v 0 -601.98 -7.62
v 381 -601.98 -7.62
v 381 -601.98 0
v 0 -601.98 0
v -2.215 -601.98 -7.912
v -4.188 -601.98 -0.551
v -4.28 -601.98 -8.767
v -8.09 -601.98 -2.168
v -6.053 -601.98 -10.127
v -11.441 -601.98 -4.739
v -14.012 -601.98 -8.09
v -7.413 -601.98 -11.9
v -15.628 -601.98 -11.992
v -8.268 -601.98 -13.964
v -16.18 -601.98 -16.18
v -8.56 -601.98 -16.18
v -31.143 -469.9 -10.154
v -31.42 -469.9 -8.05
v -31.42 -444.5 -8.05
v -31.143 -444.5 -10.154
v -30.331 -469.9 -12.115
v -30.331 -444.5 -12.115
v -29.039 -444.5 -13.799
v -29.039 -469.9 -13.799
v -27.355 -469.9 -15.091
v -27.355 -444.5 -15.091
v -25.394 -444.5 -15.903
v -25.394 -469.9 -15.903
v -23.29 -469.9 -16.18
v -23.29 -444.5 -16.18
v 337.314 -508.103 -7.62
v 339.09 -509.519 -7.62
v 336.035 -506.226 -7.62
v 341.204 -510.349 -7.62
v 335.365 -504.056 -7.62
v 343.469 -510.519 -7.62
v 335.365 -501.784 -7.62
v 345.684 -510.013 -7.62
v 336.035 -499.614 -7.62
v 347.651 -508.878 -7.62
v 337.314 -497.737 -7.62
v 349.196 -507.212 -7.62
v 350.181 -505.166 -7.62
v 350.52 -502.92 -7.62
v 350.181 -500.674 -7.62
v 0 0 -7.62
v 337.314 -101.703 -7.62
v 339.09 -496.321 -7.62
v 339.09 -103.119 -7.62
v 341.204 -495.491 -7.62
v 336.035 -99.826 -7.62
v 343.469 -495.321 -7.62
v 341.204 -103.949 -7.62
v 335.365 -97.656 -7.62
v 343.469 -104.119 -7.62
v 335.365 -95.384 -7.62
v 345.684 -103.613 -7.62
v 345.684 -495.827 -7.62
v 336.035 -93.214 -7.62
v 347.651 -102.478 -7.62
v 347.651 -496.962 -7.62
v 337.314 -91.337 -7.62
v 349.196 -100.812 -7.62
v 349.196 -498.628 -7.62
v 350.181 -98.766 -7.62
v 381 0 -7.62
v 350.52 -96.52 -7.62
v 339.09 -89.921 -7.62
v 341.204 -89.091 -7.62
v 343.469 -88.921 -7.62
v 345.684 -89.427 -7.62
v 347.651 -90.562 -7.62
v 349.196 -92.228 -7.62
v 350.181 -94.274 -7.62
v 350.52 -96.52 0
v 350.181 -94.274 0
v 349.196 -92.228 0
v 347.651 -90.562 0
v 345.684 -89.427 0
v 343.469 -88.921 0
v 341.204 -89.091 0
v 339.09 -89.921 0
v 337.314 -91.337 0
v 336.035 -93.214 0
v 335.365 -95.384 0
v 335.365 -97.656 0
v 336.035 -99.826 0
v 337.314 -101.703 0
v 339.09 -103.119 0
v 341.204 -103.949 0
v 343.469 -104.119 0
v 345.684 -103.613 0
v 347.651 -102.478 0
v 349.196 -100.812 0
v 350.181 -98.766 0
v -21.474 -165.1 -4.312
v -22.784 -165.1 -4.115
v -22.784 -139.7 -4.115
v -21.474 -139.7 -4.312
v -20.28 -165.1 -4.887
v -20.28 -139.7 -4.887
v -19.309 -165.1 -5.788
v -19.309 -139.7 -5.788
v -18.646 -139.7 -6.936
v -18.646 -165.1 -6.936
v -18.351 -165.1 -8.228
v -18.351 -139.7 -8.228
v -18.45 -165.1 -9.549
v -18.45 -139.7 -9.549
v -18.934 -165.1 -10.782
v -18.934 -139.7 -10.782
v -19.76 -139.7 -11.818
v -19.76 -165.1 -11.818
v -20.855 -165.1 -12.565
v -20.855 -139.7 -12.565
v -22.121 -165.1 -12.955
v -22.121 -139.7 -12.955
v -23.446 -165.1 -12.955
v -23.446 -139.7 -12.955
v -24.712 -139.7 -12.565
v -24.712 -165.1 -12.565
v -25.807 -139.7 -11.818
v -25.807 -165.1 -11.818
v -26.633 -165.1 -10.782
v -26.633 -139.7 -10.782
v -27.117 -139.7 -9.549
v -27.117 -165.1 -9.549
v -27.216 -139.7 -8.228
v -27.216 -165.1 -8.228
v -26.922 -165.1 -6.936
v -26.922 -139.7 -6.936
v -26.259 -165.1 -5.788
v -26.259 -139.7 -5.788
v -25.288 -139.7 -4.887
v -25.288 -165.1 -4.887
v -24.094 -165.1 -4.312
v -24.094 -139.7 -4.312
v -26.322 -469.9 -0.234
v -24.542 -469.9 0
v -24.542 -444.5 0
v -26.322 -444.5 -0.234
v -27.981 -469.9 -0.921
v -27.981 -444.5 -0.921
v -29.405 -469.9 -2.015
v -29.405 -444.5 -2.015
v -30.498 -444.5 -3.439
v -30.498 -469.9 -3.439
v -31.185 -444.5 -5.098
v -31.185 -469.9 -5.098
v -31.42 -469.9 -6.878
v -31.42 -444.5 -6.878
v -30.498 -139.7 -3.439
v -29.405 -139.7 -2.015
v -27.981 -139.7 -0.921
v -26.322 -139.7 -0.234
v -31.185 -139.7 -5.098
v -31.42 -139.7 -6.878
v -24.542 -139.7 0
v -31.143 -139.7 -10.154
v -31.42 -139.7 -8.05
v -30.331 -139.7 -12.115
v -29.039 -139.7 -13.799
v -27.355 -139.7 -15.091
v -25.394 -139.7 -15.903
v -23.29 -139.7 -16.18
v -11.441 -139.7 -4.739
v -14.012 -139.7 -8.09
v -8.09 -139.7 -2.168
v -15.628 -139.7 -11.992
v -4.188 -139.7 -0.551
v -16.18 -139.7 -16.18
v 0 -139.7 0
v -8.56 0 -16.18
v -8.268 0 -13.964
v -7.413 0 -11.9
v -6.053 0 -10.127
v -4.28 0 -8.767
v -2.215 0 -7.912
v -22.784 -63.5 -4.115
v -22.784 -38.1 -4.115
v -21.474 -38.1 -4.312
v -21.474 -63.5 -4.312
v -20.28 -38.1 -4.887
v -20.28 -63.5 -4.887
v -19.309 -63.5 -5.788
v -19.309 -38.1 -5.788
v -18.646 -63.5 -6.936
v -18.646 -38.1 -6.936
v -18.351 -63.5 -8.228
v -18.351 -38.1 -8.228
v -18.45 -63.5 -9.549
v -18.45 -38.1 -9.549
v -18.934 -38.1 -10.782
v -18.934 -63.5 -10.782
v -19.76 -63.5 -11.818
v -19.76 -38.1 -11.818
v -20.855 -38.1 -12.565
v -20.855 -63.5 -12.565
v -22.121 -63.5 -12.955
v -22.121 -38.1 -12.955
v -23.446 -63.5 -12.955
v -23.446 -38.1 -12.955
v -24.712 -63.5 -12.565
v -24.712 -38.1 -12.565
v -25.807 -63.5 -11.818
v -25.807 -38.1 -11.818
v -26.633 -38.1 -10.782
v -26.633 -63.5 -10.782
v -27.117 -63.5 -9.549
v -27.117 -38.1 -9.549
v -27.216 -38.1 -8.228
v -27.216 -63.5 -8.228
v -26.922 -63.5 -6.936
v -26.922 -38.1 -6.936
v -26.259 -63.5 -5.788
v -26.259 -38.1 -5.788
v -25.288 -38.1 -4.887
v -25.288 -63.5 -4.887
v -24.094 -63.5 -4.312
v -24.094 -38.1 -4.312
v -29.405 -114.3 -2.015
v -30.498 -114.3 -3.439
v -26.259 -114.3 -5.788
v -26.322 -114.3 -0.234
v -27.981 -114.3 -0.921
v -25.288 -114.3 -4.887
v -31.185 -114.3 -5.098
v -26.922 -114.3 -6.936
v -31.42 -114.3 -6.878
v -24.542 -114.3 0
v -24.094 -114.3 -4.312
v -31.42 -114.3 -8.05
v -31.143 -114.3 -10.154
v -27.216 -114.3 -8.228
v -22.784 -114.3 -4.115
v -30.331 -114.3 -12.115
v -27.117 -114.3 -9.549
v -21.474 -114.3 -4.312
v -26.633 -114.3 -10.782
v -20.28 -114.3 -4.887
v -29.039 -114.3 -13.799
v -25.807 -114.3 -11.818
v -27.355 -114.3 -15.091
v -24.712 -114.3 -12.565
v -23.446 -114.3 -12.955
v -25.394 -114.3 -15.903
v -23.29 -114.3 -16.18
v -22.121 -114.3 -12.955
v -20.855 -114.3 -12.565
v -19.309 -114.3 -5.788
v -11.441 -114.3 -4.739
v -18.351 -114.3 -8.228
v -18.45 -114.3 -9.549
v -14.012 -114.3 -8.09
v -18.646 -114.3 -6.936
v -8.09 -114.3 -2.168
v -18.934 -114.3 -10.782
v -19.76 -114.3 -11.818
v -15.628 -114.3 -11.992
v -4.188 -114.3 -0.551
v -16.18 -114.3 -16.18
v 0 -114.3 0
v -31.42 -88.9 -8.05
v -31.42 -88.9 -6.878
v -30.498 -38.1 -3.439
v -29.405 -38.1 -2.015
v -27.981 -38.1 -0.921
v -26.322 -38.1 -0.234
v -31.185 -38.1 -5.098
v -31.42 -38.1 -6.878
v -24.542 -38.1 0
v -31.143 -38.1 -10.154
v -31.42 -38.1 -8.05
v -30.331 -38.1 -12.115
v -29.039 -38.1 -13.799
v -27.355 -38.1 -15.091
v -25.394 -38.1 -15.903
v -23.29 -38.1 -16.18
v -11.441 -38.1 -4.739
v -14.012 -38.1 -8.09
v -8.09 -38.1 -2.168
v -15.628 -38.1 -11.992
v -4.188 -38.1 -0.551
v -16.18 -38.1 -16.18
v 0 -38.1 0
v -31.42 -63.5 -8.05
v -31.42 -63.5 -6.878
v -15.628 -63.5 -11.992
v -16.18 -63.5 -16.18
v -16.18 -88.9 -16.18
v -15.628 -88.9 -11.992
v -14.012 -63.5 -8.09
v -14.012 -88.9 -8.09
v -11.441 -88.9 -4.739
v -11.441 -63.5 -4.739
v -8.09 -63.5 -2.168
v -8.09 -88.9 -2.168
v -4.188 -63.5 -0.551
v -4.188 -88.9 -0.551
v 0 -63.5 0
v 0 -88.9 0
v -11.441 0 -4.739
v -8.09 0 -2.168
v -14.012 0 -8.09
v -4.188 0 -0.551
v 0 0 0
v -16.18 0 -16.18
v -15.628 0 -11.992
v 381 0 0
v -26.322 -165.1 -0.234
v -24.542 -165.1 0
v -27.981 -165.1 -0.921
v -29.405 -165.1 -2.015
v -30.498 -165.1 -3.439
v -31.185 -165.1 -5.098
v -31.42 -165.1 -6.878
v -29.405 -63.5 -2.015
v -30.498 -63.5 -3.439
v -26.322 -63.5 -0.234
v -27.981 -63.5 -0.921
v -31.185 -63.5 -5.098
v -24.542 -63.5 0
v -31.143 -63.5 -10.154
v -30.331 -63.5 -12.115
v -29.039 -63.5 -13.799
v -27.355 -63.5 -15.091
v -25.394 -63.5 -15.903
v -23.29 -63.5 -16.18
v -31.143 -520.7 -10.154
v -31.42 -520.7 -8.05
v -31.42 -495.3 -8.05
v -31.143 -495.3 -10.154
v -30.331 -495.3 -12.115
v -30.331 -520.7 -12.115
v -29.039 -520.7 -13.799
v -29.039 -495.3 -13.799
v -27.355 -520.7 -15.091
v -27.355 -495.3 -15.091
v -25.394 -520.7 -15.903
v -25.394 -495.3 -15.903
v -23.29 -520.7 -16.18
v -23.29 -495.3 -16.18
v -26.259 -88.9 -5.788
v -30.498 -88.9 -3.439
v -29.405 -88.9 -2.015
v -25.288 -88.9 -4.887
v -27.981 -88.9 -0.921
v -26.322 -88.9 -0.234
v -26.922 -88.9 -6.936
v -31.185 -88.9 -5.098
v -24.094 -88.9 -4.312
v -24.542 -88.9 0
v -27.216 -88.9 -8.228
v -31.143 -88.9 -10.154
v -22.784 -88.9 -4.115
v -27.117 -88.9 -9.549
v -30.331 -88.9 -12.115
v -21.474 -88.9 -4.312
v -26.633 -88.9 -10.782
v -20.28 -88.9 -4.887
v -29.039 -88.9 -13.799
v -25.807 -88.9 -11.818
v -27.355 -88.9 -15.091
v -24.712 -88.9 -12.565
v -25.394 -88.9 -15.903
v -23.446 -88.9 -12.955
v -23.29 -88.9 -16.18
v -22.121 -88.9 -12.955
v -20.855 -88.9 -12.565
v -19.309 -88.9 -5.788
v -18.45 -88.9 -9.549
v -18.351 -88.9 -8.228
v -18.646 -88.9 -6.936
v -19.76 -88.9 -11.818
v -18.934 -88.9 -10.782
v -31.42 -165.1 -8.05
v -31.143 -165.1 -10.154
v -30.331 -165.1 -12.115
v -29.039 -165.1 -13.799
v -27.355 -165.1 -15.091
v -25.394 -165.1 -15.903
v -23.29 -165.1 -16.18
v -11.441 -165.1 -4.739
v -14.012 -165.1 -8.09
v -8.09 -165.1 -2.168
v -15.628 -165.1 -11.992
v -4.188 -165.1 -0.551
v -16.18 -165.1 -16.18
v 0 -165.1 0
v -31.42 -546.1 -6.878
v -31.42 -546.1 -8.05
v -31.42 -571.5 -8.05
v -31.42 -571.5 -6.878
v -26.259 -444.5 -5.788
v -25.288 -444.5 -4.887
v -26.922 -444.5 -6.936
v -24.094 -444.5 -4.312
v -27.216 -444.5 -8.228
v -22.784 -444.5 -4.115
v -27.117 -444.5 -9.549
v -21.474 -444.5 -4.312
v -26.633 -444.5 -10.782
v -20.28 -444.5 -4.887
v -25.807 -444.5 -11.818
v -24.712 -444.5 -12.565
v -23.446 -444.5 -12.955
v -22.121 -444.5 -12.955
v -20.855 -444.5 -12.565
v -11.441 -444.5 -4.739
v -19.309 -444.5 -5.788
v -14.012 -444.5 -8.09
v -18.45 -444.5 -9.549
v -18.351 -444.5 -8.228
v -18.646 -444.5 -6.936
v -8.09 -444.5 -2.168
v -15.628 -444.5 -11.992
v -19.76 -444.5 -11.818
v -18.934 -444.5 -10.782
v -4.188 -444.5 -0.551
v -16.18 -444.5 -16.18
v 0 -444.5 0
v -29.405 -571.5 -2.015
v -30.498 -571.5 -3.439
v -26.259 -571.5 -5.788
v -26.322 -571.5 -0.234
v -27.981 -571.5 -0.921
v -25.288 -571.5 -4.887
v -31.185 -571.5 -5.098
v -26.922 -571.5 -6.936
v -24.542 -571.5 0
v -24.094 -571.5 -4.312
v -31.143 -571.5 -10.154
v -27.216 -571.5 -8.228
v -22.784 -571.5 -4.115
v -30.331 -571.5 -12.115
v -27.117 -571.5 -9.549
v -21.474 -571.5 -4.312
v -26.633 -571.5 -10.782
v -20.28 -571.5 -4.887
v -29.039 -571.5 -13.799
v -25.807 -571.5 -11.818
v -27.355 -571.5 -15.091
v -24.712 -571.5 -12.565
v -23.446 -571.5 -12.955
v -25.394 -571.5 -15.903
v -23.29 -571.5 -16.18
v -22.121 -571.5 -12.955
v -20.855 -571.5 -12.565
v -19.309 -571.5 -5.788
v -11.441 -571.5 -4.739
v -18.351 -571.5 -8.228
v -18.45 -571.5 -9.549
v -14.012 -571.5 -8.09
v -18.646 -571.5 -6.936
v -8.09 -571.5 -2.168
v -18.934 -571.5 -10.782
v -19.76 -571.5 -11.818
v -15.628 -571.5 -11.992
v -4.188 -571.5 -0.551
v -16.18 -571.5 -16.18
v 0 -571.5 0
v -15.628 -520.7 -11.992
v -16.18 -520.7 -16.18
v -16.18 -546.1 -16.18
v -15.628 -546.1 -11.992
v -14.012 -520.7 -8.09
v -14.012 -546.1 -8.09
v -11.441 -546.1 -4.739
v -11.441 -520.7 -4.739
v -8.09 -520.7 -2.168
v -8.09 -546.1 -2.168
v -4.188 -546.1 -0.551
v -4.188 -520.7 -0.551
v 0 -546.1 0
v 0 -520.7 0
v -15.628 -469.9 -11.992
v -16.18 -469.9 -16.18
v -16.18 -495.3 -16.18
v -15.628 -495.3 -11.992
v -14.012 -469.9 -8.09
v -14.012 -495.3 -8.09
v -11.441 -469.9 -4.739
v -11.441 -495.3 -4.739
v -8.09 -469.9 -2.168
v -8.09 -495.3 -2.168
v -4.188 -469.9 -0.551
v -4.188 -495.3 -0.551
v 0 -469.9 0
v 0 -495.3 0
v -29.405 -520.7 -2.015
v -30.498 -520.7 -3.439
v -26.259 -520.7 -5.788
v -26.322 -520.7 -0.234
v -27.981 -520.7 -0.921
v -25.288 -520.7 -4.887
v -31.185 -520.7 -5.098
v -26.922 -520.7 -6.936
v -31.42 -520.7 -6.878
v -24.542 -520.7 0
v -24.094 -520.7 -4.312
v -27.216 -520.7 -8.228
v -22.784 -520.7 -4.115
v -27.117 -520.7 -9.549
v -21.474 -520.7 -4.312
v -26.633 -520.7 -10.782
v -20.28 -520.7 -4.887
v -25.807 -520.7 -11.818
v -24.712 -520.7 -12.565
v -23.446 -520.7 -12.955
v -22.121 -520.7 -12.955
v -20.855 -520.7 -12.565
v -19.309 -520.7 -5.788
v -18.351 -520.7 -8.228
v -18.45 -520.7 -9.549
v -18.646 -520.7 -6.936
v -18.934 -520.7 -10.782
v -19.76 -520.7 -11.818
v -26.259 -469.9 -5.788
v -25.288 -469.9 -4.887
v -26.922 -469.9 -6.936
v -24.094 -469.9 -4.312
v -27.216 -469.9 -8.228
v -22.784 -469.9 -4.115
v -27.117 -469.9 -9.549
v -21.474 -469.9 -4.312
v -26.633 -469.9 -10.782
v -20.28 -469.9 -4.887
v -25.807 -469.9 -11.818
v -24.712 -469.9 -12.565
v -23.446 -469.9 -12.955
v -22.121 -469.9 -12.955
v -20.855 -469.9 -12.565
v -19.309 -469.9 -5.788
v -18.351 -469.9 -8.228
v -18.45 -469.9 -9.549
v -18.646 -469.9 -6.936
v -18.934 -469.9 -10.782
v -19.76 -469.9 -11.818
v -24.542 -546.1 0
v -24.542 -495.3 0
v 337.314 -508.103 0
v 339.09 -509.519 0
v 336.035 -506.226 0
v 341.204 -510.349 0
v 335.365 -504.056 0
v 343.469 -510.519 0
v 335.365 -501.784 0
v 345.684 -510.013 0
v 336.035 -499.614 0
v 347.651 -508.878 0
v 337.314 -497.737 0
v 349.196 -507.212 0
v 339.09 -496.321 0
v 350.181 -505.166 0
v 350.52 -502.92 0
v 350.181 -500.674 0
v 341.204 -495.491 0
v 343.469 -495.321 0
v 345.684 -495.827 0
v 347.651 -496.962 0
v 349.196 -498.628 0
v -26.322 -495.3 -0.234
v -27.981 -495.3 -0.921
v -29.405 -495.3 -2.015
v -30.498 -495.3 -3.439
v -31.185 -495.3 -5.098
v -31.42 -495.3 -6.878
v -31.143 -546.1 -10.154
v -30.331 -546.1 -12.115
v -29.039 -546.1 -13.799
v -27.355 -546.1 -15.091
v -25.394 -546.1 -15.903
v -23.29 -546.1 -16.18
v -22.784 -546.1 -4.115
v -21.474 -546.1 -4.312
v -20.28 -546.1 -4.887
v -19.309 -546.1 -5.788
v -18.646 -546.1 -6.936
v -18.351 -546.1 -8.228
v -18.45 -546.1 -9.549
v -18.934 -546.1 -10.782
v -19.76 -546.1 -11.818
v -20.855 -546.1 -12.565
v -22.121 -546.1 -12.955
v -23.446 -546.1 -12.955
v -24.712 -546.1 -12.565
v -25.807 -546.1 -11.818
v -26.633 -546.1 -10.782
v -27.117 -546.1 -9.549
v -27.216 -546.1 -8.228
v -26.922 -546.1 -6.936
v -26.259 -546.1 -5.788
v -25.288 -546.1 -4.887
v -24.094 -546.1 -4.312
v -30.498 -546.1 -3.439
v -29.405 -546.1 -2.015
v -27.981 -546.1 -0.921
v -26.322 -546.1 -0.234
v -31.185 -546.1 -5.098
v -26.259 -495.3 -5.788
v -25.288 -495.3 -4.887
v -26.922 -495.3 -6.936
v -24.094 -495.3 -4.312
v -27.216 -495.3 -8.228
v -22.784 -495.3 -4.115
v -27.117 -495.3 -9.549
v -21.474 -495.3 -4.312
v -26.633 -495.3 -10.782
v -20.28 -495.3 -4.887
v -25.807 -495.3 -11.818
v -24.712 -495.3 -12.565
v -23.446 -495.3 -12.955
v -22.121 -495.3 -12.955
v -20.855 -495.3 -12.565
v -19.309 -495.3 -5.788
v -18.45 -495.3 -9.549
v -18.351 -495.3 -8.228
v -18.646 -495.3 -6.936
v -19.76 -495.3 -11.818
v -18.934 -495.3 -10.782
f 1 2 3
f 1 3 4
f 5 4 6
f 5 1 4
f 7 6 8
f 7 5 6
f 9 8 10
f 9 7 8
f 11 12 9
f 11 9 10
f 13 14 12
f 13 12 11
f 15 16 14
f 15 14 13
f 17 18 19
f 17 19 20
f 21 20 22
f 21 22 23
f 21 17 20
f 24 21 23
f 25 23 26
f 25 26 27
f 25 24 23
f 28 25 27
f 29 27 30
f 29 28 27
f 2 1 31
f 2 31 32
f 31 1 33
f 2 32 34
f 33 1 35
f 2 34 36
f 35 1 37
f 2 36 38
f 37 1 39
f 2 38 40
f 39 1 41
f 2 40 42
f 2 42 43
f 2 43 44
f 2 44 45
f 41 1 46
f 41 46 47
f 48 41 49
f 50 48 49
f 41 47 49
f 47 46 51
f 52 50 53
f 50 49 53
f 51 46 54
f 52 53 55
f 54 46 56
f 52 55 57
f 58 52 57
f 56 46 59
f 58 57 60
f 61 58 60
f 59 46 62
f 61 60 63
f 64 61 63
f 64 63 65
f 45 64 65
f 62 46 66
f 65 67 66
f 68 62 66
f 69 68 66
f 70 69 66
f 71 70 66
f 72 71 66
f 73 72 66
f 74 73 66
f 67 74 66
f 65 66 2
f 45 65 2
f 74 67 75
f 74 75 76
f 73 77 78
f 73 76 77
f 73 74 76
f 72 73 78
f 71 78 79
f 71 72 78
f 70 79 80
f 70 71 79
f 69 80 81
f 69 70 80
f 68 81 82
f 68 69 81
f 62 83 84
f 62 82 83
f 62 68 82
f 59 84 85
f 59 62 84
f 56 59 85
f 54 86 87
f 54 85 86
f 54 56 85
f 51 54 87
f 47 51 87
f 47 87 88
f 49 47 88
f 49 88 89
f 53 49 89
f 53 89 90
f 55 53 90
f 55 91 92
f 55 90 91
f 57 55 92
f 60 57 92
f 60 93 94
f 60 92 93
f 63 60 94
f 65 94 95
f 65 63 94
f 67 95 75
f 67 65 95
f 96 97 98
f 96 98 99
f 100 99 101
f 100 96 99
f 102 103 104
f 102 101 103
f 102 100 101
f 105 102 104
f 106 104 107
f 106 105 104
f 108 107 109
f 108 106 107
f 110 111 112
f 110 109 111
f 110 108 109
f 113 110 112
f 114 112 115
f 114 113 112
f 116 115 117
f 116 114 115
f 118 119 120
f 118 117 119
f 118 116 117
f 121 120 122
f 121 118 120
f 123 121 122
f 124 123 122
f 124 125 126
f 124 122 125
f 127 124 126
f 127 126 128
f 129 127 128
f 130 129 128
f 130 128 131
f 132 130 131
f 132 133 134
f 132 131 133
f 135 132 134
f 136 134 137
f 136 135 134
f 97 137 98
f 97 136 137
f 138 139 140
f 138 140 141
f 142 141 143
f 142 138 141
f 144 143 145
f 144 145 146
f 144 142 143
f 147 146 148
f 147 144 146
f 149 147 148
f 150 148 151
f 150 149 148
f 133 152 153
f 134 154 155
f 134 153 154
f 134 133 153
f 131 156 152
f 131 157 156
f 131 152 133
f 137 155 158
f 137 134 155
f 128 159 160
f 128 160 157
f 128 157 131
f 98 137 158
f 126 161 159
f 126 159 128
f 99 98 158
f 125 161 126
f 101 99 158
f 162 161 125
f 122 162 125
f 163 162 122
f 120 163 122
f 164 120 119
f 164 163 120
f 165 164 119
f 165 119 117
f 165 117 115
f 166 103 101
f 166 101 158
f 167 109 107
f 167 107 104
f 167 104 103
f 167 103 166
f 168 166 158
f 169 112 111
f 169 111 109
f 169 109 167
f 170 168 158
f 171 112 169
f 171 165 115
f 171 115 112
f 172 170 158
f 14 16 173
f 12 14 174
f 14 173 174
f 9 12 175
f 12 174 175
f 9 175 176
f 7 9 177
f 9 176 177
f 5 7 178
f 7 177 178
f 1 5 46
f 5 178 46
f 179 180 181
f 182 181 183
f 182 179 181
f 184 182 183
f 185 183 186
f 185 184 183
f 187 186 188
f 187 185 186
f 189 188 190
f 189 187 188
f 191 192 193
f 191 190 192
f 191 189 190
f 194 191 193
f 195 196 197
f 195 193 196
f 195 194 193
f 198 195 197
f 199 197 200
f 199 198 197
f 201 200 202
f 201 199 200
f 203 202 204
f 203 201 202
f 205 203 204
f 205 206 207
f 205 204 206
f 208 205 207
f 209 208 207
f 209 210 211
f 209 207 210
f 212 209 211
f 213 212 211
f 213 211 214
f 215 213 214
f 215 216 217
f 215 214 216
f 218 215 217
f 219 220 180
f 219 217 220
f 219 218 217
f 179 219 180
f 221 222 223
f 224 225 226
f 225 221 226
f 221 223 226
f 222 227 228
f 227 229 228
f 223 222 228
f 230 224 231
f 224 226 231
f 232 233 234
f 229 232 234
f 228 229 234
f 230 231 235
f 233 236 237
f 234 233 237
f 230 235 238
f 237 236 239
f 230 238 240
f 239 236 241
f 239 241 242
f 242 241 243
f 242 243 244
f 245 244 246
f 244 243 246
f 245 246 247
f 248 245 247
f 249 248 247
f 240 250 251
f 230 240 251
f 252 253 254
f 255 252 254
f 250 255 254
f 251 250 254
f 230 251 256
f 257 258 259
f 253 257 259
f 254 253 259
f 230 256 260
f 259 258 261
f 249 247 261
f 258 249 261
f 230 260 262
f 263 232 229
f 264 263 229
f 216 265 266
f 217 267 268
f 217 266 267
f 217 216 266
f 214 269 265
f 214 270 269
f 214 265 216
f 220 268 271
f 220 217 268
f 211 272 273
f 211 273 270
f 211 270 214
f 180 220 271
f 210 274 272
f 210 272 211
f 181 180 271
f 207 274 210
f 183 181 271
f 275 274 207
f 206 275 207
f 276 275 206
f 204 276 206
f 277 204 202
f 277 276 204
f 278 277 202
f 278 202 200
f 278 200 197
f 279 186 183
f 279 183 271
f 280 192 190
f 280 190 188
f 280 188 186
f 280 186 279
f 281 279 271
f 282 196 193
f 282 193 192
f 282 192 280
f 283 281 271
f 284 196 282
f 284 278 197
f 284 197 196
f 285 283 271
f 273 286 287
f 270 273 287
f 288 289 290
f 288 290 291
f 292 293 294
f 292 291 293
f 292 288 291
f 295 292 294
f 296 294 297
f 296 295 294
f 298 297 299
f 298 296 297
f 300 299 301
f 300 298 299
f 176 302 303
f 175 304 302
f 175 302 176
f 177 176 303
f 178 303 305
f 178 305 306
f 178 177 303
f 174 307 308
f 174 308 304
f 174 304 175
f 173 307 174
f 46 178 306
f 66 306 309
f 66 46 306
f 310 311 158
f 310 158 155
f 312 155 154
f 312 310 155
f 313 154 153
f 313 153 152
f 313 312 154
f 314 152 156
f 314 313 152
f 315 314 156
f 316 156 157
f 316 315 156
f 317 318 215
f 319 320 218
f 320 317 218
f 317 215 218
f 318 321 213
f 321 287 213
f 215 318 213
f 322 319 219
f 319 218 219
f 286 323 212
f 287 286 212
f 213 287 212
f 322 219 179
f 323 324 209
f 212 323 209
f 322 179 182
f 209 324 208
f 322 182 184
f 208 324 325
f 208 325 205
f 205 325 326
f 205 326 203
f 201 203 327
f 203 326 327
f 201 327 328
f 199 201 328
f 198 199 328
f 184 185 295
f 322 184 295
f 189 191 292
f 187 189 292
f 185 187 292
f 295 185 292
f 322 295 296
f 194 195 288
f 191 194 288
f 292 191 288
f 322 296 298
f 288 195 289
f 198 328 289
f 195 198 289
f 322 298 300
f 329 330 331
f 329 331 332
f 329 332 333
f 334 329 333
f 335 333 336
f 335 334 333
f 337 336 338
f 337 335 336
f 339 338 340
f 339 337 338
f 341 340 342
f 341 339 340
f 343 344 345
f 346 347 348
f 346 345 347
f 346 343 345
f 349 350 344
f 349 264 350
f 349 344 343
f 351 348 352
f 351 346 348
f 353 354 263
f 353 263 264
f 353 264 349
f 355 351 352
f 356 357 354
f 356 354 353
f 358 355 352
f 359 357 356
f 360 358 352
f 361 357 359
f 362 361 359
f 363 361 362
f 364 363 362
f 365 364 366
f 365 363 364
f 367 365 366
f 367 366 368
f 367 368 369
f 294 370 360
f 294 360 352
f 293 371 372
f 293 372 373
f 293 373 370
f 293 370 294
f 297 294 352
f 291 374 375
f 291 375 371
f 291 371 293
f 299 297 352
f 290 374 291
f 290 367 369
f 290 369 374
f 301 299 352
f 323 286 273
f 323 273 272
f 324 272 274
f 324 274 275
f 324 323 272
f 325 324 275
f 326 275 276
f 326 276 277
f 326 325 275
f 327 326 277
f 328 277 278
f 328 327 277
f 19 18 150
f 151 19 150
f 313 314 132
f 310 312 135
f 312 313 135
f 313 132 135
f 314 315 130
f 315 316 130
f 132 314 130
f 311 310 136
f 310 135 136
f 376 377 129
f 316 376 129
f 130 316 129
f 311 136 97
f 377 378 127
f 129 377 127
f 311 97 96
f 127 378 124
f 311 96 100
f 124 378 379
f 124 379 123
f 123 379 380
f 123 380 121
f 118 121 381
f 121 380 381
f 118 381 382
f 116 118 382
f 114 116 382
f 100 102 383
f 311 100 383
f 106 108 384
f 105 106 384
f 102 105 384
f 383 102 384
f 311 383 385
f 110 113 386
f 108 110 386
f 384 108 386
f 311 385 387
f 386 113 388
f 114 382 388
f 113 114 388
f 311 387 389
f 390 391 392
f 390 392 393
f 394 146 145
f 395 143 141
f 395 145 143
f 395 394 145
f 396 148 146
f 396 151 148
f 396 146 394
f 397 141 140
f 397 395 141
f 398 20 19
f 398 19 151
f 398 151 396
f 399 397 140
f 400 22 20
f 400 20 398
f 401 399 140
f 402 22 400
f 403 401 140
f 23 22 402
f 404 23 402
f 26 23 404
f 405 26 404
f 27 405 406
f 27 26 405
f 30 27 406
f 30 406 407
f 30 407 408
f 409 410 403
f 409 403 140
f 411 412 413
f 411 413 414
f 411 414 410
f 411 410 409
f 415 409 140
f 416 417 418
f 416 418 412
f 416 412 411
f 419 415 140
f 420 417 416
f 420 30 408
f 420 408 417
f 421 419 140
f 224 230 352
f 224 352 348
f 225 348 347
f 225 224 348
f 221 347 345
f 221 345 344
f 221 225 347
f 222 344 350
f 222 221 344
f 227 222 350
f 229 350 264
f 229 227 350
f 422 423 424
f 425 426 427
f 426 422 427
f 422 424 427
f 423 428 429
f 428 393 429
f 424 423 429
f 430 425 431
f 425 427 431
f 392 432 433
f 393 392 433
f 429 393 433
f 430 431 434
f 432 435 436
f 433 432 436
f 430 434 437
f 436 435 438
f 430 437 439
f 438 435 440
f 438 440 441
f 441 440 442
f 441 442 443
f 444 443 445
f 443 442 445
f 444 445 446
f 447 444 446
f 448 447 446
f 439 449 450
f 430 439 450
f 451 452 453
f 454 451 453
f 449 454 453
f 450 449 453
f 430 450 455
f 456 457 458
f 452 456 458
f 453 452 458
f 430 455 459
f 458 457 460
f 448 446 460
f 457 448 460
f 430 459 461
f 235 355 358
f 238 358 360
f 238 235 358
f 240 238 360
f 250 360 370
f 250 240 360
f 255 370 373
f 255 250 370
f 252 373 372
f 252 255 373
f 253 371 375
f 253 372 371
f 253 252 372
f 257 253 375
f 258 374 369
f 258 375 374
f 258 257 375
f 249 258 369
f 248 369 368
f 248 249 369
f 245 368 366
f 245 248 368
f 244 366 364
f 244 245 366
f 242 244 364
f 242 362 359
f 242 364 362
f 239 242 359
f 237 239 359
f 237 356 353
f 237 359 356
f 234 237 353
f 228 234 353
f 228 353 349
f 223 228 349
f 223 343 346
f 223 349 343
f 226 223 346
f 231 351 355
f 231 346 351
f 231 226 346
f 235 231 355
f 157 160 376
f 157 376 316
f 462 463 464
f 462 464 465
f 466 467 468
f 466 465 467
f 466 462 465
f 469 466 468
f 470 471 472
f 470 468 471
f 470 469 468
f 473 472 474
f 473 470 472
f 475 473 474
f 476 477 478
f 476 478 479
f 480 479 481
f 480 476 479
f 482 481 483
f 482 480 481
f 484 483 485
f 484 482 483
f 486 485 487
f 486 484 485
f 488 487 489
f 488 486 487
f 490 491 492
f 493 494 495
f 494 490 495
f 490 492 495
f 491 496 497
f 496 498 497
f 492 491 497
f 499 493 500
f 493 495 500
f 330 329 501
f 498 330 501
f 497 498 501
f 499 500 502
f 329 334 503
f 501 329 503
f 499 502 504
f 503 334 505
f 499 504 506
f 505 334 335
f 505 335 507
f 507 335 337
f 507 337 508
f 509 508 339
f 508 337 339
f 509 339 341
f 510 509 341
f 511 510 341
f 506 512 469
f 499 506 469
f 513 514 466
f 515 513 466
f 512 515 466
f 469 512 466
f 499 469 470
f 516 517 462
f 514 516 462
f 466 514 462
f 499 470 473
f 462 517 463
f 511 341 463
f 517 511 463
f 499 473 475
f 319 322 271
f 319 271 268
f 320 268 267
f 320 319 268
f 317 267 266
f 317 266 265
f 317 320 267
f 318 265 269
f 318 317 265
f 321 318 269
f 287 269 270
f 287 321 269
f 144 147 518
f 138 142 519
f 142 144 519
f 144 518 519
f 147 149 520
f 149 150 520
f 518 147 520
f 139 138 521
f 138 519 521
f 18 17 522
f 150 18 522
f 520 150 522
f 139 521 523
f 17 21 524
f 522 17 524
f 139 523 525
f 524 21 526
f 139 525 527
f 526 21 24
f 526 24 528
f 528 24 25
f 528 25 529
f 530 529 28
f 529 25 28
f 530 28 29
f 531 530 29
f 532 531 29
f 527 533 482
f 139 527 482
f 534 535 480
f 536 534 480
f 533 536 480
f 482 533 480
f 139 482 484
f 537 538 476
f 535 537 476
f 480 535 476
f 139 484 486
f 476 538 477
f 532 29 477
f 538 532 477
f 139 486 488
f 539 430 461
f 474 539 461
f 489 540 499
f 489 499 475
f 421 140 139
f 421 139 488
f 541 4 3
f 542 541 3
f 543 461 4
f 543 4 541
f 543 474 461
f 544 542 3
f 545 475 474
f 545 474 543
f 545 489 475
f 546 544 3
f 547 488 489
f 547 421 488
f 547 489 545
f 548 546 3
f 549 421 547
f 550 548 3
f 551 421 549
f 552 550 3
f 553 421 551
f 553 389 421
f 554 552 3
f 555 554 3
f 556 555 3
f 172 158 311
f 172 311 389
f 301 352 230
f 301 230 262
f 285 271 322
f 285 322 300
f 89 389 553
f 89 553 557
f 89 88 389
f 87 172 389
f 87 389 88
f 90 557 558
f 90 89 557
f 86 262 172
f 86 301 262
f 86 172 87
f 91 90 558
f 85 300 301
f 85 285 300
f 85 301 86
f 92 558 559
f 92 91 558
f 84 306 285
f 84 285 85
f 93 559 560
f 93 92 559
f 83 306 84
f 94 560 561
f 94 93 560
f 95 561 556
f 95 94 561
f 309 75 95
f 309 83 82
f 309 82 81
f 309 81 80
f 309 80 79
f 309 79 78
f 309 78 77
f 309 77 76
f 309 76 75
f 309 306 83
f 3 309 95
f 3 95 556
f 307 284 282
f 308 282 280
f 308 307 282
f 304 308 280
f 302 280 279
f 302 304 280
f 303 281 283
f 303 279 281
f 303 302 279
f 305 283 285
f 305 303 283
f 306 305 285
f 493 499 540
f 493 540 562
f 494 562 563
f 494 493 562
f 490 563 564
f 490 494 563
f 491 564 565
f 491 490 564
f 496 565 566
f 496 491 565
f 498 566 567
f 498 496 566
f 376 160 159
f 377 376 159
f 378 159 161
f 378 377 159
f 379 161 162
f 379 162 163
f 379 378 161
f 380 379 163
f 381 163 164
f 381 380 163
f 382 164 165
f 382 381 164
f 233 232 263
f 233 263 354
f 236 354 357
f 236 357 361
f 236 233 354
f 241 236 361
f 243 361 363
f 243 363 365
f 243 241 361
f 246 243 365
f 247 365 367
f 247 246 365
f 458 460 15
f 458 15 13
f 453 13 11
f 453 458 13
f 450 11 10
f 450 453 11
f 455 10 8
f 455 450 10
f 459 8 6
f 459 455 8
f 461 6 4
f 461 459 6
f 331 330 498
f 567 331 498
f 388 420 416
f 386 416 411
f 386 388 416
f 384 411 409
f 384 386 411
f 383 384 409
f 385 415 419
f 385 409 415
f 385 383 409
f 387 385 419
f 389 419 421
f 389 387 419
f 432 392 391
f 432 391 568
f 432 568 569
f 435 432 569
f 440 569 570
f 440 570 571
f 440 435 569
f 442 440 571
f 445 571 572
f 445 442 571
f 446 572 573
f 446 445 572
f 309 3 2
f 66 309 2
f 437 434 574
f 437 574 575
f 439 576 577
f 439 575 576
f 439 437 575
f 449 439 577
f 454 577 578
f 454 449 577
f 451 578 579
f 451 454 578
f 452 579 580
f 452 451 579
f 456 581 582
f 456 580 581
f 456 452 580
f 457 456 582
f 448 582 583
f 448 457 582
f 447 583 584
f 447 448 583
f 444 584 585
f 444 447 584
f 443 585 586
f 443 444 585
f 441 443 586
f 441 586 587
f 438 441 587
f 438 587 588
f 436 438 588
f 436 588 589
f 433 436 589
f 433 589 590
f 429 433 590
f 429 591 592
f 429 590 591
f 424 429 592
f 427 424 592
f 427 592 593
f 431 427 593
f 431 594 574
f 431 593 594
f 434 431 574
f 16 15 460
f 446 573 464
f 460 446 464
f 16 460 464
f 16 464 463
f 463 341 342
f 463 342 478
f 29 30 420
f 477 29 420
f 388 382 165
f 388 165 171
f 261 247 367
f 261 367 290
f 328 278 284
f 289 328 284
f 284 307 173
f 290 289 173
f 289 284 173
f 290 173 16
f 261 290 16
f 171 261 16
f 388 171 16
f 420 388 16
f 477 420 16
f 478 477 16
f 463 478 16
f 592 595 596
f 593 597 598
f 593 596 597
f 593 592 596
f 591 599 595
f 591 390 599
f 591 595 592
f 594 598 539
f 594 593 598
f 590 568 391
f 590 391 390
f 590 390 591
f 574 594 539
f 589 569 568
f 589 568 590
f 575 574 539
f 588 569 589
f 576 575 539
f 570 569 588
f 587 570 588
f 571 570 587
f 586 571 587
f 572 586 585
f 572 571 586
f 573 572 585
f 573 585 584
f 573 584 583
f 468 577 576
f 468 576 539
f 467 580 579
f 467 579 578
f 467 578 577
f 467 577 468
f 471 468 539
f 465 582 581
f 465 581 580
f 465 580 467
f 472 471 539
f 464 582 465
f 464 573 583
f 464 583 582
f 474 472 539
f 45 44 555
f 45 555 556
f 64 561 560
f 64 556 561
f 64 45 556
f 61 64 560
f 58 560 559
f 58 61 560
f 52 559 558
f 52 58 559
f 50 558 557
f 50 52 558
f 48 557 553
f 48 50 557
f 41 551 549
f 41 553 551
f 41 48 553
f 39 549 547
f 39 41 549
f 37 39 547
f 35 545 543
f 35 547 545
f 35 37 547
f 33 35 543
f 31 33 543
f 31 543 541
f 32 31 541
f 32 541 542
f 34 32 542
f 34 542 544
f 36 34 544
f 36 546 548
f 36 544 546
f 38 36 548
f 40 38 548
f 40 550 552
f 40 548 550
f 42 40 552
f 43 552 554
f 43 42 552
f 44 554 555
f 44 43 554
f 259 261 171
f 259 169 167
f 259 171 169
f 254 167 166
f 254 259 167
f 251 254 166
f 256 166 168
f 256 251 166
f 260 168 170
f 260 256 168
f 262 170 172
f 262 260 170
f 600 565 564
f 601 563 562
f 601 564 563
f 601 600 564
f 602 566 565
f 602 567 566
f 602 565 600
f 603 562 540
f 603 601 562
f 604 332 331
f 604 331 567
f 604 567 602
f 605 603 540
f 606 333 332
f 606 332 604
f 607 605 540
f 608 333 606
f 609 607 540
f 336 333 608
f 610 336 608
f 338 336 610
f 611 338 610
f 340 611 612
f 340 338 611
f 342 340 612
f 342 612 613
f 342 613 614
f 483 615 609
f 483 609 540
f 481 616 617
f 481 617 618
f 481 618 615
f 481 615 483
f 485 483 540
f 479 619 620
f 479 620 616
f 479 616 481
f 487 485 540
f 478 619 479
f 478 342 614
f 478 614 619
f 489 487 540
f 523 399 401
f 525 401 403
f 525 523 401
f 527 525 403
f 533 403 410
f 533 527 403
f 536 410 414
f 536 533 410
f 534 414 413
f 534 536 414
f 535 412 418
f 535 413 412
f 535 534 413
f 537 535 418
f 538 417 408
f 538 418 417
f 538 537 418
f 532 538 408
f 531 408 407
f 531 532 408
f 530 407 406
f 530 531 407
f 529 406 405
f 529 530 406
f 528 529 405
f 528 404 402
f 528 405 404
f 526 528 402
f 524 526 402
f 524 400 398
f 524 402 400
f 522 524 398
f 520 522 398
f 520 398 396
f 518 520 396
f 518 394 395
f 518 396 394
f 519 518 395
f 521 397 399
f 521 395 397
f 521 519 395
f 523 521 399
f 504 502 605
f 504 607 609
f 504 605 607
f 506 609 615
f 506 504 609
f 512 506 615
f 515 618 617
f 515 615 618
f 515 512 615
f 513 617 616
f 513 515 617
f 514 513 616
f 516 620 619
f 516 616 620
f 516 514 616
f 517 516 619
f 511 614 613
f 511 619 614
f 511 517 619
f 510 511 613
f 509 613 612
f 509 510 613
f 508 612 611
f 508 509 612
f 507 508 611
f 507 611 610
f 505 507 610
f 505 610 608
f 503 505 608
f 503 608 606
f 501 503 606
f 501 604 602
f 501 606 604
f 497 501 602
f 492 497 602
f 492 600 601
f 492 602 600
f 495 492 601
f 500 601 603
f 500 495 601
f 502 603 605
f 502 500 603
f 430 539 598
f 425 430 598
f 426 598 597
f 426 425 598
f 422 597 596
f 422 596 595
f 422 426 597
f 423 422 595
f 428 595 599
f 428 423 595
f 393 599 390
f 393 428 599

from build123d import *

# Parameters (mm, degrees)
BOSS_EXTRUDE1_DEPTH     = 609.6
SHELL1_T                = -7.62
SKETCH3_W               = 28.861952205
SKETCH3_H               = 274.814581436
CUT_EXTRUDE2_DEPTH      = 609.6
SKETCH4_W               = 397.1798
SKETCH4_H               = 244.7798
CUT_EXTRUDE3_DEPTH      = 609.6
SKETCH5_W               = 397.1798
SKETCH5_H               = 7.62
CUT_EXTRUDE4_DEPTH      = 609.6
BOSS_EXTRUDE4_START     = 25.4
BOSS_EXTRUDE4_DEPTH     = 25.4
LPATTERN2_COUNT         = 3
LPATTERN2_PITCH         = 50.8
LPATTERN3_COUNT         = 2
LPATTERN3_PITCH         = 508
LPATTERN6_COUNT         = 2
LPATTERN6_PITCH         = 457.2
LPATTERN7_COUNT         = 2
LPATTERN7_PITCH         = 406.4
CUT_EXTRUDE5_DEPTH      = 660.835961681
CUT_EXTRUDE5_DEPTH_BACK = 660.835961681
SKETCH11_R              = 4.445
CUT_EXTRUDE6_DEPTH      = 660.835961681
CUT_EXTRUDE6_DEPTH_BACK = 660.835961681
CUT_EXTRUDE7_DEPTH      = 681.722733812
CUT_EXTRUDE7_DEPTH_BACK = 681.722733812
CUT_EXTRUDE8_DEPTH      = 713.602768959
CUT_EXTRUDE8_DEPTH_BACK = 713.602768959
SKETCH16_R              = 7.62


with BuildPart() as part:
    # Sketch1 → Boss-Extrude1 (new body)
    with BuildSketch(Plane(origin=(0, 0, 0), x_dir=(1, 0, 0), z_dir=(0, 1, 0))):
        with BuildLine():
            Line((0, 0), (381, 0))
            ThreePointArc((381, 0), (392.440846298, 4.738953702), (397.1798, 16.1798))
            Line((397.1798, 16.1798), (397.1798, 244.7798))
            ThreePointArc((397.1798, 244.7798), (392.440846298, 256.220646298), (381, 260.9596))
            Line((381, 260.9596), (0, 260.9596))
            ThreePointArc((0, 260.9596), (-11.440846298, 256.220646298), (-16.1798, 244.7798))
            Line((-16.1798, 244.7798), (-16.1798, 16.1798))
            ThreePointArc((-16.1798, 16.1798), (-11.440846298, 4.738953702), (0, 0))
        make_face()
    extrude(amount=-BOSS_EXTRUDE1_DEPTH)

    # Shell1
    shell1_openings = [part.faces().sort_by_distance(p)[0] for p in [
        (190.5, 0, -130.4798),
    ]]
    offset(amount=SHELL1_T, openings=shell1_openings, kind=Kind.INTERSECTION)

    # Sketch3 → Cut-Extrude2 (cut)
    with BuildSketch(Plane(origin=(0, 0, 0), x_dir=(1, 0, 0), z_dir=(0, 1, 0))):
        with Locations((395.430976103, 137.407290718)):
            Rectangle(SKETCH3_W, SKETCH3_H)
    extrude(amount=-CUT_EXTRUDE2_DEPTH, mode=Mode.SUBTRACT)

    # Sketch4 → Cut-Extrude3 (cut)
    with BuildSketch(Plane(origin=(0, 0, 0), x_dir=(1, 0, 0), z_dir=(0, 1, 0))):
        with Locations((182.4101, 138.5697)):
            Rectangle(SKETCH4_W, SKETCH4_H)
    extrude(amount=-CUT_EXTRUDE3_DEPTH, mode=Mode.SUBTRACT)

    # Sketch5 → Cut-Extrude4 (cut)
    with BuildSketch(Plane(origin=(0, 0, -16.1798), x_dir=(-1, 0, 0), z_dir=(0, 0, -1))):
        with Locations((-182.4101, -605.79)):
            Rectangle(SKETCH5_W, SKETCH5_H)
    extrude(amount=-CUT_EXTRUDE4_DEPTH, mode=Mode.SUBTRACT)

    # Sketch8 → Boss-Extrude4 (add)
    with BuildSketch(Plane(origin=(0, -63.5, 0), x_dir=(1, 0, 0), z_dir=(0, 1, 0)).offset(BOSS_EXTRUDE4_START)):
        with BuildLine():
            Line((-16.1798, 16.1798), (-31.4198, 16.1798))
            Line((-31.4198, 16.1798), (-31.4198, 3.2512))
            ThreePointArc((-31.4198, 3.2512), (-30.467545567, 0.952254433), (-28.1686, 0))
            Line((-28.1686, 0), (0, 0))
            ThreePointArc((0, 0), (-11.440846298, 4.738953702), (-16.1798, 16.1798))
        make_face()
    boss_extrude4 = extrude(amount=-BOSS_EXTRUDE4_DEPTH)

    # LPattern2: Boss-Extrude4 ×3
    with Locations(*[(0, -i * LPATTERN2_PITCH, 0) for i in range(1, LPATTERN2_COUNT)]):
        add(boss_extrude4)

    # LPattern3: Boss-Extrude4 ×2
    with Locations(*[(0, -i * LPATTERN3_PITCH, 0) for i in range(1, LPATTERN3_COUNT)]):
        add(boss_extrude4)

    # LPattern6: Boss-Extrude4 ×2
    with Locations(*[(0, -i * LPATTERN6_PITCH, 0) for i in range(1, LPATTERN6_COUNT)]):
        add(boss_extrude4)

    # LPattern7: Boss-Extrude4 ×2
    with Locations(*[(0, -i * LPATTERN7_PITCH, 0) for i in range(1, LPATTERN7_COUNT)]):
        add(boss_extrude4)

    # Sketch11 → Cut-Extrude5 (cut, two sides: drawn at the far end of the back side and taken through both)
    with BuildSketch(Plane(origin=(0, -63.5, 0), x_dir=(1, 0, 0), z_dir=(0, 1, 0)).offset(-CUT_EXTRUDE5_DEPTH_BACK)):
        with Locations(Location((-22.7838, 8.5598, 0), (0, 0, 270))):
            Circle(SKETCH11_R)
    extrude(amount=CUT_EXTRUDE5_DEPTH + CUT_EXTRUDE5_DEPTH_BACK, mode=Mode.SUBTRACT)

    # Sketch14 → Cut-Extrude6 (cut, two sides: drawn at the far end of the back side and taken through both)
    with BuildSketch(Plane(origin=(0, -63.5, 0), x_dir=(1, 0, 0), z_dir=(0, 1, 0)).offset(-CUT_EXTRUDE6_DEPTH_BACK)):
        with BuildLine():
            Line((-23.2901518, 16.1798), (-23.2901518, 22.367061587))
            Line((-23.2901518, 22.367061587), (-43.448334217, 22.367061587))
            Line((-43.448334217, 22.367061587), (-43.448334217, 8.0501518))
            Line((-43.448334217, 8.0501518), (-31.4198, 8.0501518))
            ThreePointArc((-31.4198, 8.0501518), (-29.038681171, 13.798681171), (-23.2901518, 16.1798))
        make_face()
    extrude(amount=CUT_EXTRUDE6_DEPTH + CUT_EXTRUDE6_DEPTH_BACK, mode=Mode.SUBTRACT)

    # Sketch15 → Cut-Extrude7 (cut, two sides: drawn at the far end of the back side and taken through both)
    with BuildSketch(Plane(origin=(0, -38.1, 0), x_dir=(1, 0, 0), z_dir=(0, 1, 0)).offset(-CUT_EXTRUDE7_DEPTH_BACK)):
        with BuildLine():
            Line((-31.4198, 6.877959665), (-31.4198, 0))
            Line((-31.4198, 0), (-24.541840335, 0))
            ThreePointArc((-24.541840335, 0), (-29.405292255, 2.014507745), (-31.4198, 6.877959665))
        make_face()
    extrude(amount=CUT_EXTRUDE7_DEPTH + CUT_EXTRUDE7_DEPTH_BACK, mode=Mode.SUBTRACT)

    # Sketch16 → Cut-Extrude8 (cut, two sides: drawn at the far end of the back side and taken through both)
    with BuildSketch(Plane.XY.offset(-CUT_EXTRUDE8_DEPTH_BACK)):
        with Locations((342.9, -96.52)):
            Circle(SKETCH16_R)
        with Locations((342.9, -502.92)):
            Circle(SKETCH16_R)
    extrude(amount=CUT_EXTRUDE8_DEPTH + CUT_EXTRUDE8_DEPTH_BACK, mode=Mode.SUBTRACT)


solid = part.part
